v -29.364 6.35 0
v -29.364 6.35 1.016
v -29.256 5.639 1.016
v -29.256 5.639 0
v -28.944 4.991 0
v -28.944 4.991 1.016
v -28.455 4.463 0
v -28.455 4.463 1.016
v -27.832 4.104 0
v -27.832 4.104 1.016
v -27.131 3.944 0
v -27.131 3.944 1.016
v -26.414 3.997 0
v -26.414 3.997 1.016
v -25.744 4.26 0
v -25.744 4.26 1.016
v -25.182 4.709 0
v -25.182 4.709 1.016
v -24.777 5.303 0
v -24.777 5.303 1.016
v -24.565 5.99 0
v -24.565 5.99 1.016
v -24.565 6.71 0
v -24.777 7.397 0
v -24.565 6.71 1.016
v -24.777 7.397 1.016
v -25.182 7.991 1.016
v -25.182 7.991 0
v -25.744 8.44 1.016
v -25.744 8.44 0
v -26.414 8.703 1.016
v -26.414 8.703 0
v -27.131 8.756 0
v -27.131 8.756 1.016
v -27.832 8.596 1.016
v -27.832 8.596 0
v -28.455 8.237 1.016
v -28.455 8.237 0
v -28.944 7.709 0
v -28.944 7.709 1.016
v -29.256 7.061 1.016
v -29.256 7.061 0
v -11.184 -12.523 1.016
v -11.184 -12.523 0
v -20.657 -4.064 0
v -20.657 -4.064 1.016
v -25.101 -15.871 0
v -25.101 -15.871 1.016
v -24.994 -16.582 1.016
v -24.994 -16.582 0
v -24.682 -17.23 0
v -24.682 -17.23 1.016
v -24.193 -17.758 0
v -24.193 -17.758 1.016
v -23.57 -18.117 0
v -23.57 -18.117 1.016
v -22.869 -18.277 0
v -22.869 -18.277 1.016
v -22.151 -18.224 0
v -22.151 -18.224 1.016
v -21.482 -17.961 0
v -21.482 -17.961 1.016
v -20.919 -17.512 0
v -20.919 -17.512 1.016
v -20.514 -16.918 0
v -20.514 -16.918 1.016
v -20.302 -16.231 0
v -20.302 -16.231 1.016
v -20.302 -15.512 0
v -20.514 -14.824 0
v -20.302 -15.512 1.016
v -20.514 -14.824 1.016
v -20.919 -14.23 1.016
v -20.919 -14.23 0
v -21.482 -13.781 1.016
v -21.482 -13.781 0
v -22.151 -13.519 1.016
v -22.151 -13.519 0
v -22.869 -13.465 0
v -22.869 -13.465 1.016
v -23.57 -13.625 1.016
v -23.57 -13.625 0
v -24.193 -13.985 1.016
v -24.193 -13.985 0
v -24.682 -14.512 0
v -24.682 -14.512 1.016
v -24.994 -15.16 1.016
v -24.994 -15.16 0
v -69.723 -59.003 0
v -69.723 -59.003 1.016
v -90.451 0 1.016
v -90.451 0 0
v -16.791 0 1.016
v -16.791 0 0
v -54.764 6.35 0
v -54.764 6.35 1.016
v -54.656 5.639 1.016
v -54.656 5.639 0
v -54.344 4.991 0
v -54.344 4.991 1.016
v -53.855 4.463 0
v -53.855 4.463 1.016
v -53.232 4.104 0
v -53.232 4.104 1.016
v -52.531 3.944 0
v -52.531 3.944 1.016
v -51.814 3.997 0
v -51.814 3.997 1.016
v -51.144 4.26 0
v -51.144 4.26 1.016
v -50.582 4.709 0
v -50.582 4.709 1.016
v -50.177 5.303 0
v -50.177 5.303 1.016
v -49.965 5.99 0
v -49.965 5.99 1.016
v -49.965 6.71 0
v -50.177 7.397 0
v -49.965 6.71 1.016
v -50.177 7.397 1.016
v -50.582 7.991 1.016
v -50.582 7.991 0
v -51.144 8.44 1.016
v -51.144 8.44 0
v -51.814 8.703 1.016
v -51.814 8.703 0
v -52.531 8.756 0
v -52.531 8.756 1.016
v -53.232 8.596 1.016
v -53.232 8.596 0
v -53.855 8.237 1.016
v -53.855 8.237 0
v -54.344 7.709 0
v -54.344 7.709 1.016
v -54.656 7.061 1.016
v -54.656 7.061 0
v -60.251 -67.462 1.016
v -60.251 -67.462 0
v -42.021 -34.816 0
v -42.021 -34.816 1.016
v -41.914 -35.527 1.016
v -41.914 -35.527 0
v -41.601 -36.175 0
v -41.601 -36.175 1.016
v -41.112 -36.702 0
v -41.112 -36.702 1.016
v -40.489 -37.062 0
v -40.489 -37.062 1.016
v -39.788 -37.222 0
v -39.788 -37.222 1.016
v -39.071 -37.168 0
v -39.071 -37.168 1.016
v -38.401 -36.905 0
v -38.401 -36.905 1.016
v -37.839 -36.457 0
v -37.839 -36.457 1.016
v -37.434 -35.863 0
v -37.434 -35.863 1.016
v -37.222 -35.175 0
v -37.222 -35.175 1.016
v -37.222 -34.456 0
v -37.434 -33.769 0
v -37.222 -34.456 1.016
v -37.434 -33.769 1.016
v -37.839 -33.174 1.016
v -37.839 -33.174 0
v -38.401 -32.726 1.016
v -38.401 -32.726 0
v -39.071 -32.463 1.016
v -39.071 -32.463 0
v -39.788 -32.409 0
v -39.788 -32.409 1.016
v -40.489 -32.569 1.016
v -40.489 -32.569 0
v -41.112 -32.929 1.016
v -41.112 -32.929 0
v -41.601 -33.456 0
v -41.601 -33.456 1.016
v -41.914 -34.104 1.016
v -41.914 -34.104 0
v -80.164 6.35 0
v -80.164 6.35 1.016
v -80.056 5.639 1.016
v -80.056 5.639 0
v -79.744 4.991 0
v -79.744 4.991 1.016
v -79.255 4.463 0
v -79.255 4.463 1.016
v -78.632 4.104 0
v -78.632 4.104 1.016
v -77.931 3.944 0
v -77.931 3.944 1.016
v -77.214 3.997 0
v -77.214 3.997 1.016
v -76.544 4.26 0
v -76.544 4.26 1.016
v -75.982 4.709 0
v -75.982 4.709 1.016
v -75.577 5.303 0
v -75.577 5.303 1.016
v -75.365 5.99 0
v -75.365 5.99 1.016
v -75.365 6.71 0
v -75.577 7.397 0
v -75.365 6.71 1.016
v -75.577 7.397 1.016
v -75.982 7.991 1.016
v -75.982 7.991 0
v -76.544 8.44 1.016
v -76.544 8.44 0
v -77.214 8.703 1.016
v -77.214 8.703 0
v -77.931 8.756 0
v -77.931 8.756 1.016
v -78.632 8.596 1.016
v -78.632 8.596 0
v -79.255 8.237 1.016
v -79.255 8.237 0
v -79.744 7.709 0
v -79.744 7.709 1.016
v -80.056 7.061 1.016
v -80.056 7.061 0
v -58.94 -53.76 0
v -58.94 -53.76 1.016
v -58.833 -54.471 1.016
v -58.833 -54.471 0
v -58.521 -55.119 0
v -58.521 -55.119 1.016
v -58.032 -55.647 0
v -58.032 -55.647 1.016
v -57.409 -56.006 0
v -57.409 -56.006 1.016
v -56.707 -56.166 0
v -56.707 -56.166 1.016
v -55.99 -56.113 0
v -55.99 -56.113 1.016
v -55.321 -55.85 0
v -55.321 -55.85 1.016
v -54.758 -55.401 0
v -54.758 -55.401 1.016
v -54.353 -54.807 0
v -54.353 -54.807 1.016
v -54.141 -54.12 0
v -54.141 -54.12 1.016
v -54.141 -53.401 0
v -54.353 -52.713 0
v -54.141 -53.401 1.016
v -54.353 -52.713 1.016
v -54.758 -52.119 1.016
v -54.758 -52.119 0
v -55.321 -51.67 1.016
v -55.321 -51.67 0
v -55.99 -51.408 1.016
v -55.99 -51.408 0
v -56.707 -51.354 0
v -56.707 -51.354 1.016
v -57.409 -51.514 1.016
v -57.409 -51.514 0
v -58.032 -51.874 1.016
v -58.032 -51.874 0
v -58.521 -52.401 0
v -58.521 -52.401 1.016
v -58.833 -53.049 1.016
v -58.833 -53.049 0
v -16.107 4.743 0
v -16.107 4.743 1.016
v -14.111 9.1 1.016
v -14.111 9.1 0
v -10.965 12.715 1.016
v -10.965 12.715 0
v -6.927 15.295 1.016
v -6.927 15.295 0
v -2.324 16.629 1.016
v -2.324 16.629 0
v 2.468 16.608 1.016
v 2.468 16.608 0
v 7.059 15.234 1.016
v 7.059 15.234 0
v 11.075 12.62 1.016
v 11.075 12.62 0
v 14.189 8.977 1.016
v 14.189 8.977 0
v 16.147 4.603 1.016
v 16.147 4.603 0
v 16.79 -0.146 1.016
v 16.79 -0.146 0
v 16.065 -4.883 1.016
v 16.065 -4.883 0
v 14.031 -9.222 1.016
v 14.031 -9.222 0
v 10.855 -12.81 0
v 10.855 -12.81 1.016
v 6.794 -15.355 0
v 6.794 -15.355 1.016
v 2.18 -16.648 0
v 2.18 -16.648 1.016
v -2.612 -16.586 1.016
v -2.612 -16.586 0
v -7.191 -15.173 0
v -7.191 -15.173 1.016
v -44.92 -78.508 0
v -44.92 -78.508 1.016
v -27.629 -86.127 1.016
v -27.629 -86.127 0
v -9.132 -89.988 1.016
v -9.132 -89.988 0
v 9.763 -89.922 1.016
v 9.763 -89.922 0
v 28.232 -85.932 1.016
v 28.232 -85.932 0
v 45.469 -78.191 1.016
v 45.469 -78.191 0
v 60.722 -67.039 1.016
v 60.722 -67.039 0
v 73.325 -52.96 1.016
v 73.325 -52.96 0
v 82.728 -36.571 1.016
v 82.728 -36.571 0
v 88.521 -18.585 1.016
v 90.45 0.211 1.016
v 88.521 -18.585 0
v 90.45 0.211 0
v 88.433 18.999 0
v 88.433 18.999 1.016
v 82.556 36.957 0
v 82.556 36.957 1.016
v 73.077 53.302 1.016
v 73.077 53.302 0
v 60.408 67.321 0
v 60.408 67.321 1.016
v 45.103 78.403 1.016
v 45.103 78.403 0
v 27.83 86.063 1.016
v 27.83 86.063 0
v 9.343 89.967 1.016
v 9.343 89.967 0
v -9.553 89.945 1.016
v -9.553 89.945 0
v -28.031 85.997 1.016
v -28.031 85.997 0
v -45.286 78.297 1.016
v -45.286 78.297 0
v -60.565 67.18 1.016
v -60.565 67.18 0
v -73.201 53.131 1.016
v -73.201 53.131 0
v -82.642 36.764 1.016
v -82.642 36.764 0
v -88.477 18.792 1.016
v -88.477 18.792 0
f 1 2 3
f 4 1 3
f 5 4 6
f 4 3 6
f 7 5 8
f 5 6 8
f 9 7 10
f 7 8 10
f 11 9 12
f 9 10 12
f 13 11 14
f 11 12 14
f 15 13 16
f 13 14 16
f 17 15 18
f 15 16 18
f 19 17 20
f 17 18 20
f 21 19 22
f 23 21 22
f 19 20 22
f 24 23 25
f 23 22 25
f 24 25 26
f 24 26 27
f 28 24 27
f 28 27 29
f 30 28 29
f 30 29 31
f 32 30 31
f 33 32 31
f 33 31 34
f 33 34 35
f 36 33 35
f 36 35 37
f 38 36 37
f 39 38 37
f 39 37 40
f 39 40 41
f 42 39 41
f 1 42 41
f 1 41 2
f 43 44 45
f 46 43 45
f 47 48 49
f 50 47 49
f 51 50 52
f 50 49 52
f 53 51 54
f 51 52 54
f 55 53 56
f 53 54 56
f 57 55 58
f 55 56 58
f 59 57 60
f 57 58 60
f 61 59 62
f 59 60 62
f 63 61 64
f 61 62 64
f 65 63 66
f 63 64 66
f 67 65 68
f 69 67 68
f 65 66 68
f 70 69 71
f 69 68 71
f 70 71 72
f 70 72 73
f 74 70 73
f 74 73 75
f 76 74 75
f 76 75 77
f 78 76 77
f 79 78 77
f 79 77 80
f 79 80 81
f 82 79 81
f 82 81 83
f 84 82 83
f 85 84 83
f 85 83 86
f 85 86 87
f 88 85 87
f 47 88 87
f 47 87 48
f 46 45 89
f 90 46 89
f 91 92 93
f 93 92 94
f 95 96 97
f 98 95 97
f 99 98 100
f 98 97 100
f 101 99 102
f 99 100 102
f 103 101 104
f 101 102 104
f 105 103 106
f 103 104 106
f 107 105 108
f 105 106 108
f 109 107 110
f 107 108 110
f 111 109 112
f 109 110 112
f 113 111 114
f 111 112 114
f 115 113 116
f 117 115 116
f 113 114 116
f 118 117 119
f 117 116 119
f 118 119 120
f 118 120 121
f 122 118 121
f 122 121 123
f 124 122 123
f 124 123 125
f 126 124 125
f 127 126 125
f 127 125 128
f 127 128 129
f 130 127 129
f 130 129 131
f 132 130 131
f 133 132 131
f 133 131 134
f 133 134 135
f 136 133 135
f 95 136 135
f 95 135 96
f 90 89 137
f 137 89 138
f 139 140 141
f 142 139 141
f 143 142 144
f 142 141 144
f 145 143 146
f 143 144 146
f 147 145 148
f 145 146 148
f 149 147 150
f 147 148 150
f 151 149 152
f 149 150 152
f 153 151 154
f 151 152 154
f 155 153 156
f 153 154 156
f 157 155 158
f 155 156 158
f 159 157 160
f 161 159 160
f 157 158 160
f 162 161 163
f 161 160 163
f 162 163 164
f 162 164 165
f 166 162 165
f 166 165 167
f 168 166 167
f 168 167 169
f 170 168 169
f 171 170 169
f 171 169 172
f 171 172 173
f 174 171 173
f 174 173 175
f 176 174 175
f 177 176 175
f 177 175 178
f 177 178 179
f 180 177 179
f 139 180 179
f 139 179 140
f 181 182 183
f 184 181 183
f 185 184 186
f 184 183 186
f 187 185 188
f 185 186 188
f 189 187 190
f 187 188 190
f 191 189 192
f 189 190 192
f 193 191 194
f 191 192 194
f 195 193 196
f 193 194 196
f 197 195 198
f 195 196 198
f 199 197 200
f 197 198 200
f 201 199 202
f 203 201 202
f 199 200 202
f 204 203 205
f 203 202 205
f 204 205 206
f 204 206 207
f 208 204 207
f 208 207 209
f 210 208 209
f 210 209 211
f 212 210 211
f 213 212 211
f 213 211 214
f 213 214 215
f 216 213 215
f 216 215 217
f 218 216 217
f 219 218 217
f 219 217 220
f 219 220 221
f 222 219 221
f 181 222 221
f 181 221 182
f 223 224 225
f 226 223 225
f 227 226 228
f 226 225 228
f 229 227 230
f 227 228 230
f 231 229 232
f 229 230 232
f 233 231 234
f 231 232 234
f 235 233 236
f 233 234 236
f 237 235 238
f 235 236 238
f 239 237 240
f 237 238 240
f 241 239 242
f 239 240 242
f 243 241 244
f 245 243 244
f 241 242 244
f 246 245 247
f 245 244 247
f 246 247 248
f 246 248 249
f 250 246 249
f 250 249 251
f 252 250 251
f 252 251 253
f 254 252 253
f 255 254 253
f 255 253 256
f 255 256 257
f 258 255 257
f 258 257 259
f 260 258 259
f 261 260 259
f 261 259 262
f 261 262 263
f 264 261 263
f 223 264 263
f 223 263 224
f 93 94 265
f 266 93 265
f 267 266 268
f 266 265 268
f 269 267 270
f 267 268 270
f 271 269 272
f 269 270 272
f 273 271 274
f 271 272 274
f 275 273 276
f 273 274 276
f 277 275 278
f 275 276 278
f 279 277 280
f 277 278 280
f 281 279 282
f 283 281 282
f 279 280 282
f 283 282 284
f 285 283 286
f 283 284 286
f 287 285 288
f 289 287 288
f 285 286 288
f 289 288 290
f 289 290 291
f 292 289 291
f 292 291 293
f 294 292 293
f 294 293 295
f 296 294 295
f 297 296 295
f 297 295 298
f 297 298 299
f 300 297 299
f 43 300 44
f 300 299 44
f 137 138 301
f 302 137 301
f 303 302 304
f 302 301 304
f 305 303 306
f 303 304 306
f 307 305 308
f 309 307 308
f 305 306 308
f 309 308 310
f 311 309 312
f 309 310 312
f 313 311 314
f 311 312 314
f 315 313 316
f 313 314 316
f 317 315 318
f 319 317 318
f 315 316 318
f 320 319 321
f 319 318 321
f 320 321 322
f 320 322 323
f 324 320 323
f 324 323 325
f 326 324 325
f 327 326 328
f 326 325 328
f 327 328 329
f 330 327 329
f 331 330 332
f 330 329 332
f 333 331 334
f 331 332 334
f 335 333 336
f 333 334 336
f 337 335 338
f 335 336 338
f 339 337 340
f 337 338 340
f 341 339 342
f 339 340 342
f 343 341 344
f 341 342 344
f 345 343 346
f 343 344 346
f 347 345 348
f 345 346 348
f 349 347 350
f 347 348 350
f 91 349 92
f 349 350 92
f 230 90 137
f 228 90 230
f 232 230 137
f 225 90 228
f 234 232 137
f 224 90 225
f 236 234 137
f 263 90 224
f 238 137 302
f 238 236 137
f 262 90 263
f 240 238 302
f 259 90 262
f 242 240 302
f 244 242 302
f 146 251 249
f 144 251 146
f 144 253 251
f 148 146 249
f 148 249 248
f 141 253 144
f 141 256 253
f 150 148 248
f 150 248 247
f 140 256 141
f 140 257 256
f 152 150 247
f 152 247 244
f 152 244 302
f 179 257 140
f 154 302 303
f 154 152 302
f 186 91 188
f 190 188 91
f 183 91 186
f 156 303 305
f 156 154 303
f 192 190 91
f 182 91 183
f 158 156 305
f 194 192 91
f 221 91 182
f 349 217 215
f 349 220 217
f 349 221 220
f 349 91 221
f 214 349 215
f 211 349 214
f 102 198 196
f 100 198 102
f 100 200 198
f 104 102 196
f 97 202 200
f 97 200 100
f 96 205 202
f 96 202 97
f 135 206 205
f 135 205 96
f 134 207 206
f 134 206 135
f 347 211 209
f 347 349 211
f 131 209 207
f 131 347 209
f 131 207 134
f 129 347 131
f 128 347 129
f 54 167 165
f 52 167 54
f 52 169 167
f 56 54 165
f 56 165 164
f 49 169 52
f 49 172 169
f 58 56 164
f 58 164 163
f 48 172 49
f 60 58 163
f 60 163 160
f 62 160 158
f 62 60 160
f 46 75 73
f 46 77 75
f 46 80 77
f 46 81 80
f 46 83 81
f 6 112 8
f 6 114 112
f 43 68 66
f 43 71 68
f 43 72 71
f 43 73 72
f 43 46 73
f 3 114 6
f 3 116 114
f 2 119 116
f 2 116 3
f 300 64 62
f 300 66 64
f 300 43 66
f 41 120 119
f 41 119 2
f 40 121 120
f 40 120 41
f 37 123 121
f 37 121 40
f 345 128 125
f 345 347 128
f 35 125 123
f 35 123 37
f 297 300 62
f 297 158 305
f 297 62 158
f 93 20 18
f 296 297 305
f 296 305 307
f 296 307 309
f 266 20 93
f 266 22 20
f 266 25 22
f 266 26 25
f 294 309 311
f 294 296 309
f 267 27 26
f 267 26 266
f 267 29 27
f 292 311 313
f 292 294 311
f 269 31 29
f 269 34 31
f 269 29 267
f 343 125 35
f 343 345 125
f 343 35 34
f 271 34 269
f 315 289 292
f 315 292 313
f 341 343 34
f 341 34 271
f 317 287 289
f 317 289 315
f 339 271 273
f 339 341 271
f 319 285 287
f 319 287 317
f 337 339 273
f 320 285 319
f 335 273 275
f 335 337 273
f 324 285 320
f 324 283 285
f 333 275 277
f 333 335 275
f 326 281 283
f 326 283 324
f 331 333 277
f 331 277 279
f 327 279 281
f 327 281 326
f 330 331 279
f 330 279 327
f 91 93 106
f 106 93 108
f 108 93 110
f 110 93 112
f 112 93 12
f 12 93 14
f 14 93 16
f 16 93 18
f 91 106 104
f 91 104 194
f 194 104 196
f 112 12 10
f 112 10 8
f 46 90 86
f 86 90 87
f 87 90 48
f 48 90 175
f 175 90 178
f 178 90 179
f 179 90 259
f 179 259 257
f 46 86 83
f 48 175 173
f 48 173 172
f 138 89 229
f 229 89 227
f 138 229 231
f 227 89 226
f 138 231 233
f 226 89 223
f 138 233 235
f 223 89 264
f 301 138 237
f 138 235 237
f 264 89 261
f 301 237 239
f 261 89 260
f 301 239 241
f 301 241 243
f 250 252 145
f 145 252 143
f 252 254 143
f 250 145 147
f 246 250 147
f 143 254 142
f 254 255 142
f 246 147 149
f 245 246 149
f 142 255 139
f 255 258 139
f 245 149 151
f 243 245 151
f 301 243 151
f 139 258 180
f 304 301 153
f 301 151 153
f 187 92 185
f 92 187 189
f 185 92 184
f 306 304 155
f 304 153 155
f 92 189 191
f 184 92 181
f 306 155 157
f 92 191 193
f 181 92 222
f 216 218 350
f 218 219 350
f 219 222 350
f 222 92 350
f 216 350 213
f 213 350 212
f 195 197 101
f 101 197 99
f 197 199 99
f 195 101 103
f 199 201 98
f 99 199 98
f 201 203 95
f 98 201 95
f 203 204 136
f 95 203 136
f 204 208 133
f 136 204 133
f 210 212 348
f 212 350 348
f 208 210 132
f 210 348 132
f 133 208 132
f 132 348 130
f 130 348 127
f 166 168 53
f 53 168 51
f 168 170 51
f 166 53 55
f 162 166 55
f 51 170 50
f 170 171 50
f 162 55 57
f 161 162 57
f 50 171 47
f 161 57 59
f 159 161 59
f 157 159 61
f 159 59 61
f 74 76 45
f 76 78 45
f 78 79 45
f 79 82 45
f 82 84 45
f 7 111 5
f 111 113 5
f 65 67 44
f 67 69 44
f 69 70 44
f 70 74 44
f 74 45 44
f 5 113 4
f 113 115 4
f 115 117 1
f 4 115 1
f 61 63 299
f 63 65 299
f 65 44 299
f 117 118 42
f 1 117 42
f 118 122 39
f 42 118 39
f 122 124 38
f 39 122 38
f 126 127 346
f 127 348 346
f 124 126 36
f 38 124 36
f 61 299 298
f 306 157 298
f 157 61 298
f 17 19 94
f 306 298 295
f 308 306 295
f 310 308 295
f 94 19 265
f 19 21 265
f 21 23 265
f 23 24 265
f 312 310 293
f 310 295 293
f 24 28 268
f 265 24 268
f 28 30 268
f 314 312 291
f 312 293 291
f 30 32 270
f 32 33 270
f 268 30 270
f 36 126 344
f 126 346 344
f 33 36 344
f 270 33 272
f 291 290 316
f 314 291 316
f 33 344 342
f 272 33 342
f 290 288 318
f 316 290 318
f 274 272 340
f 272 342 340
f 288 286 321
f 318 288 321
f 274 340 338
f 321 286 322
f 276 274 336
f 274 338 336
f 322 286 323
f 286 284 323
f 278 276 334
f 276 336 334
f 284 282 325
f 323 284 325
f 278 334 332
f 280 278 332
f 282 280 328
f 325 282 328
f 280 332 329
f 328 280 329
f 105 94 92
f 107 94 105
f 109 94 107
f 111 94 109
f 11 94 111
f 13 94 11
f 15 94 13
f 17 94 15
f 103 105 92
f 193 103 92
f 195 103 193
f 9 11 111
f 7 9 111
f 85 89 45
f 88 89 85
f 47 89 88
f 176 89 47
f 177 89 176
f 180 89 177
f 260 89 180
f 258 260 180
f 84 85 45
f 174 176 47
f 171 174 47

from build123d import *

# Parameters (mm, degrees)
F1_DEPTH = 1.016
F3_D     = 4.826


with BuildPart() as f1:
    # F0 (on Top) → F1 (new body)
    with BuildSketch(Plane.XY):
        with BuildLine():
            Line((-90.4505589354, 0), (-16.7905589354, 0))
            ThreePointArc((-16.7905589354, 0), (15.3250850137, 6.8603672412), (-11.1844753183, -12.5231937307))
            Line((-11.1844753183, -12.5231937307), (-60.2506472734, -67.4623088462))
            ThreePointArc((-60.2506472734, -67.4623088462), (82.5560668086, 36.9567239459), (-90.4505589354, 0))
        make_face()
        Polygon((-60.2506472734, -67.4623088462), (-11.1844753183, -12.5231937307), (-20.6567365451, -4.0635089109), (-69.7229085002, -59.0026240263), align=None)
    extrude(amount=F1_DEPTH)

    # F3 (through all)
    with Locations(Plane(origin=(0, 0, 0), x_dir=(1, 0, 0), z_dir=(0, 0, -1))):
        with Locations((-77.7505589354, -6.35), (-52.3505589354, -6.35), (-26.9505589354, -6.35), (-22.6883537876, 15.8711603022), (-39.6077234273, 34.8156827558), (-56.5270930669, 53.7602052095)):
            Hole(F3_D / 2)


solid = f1.part
